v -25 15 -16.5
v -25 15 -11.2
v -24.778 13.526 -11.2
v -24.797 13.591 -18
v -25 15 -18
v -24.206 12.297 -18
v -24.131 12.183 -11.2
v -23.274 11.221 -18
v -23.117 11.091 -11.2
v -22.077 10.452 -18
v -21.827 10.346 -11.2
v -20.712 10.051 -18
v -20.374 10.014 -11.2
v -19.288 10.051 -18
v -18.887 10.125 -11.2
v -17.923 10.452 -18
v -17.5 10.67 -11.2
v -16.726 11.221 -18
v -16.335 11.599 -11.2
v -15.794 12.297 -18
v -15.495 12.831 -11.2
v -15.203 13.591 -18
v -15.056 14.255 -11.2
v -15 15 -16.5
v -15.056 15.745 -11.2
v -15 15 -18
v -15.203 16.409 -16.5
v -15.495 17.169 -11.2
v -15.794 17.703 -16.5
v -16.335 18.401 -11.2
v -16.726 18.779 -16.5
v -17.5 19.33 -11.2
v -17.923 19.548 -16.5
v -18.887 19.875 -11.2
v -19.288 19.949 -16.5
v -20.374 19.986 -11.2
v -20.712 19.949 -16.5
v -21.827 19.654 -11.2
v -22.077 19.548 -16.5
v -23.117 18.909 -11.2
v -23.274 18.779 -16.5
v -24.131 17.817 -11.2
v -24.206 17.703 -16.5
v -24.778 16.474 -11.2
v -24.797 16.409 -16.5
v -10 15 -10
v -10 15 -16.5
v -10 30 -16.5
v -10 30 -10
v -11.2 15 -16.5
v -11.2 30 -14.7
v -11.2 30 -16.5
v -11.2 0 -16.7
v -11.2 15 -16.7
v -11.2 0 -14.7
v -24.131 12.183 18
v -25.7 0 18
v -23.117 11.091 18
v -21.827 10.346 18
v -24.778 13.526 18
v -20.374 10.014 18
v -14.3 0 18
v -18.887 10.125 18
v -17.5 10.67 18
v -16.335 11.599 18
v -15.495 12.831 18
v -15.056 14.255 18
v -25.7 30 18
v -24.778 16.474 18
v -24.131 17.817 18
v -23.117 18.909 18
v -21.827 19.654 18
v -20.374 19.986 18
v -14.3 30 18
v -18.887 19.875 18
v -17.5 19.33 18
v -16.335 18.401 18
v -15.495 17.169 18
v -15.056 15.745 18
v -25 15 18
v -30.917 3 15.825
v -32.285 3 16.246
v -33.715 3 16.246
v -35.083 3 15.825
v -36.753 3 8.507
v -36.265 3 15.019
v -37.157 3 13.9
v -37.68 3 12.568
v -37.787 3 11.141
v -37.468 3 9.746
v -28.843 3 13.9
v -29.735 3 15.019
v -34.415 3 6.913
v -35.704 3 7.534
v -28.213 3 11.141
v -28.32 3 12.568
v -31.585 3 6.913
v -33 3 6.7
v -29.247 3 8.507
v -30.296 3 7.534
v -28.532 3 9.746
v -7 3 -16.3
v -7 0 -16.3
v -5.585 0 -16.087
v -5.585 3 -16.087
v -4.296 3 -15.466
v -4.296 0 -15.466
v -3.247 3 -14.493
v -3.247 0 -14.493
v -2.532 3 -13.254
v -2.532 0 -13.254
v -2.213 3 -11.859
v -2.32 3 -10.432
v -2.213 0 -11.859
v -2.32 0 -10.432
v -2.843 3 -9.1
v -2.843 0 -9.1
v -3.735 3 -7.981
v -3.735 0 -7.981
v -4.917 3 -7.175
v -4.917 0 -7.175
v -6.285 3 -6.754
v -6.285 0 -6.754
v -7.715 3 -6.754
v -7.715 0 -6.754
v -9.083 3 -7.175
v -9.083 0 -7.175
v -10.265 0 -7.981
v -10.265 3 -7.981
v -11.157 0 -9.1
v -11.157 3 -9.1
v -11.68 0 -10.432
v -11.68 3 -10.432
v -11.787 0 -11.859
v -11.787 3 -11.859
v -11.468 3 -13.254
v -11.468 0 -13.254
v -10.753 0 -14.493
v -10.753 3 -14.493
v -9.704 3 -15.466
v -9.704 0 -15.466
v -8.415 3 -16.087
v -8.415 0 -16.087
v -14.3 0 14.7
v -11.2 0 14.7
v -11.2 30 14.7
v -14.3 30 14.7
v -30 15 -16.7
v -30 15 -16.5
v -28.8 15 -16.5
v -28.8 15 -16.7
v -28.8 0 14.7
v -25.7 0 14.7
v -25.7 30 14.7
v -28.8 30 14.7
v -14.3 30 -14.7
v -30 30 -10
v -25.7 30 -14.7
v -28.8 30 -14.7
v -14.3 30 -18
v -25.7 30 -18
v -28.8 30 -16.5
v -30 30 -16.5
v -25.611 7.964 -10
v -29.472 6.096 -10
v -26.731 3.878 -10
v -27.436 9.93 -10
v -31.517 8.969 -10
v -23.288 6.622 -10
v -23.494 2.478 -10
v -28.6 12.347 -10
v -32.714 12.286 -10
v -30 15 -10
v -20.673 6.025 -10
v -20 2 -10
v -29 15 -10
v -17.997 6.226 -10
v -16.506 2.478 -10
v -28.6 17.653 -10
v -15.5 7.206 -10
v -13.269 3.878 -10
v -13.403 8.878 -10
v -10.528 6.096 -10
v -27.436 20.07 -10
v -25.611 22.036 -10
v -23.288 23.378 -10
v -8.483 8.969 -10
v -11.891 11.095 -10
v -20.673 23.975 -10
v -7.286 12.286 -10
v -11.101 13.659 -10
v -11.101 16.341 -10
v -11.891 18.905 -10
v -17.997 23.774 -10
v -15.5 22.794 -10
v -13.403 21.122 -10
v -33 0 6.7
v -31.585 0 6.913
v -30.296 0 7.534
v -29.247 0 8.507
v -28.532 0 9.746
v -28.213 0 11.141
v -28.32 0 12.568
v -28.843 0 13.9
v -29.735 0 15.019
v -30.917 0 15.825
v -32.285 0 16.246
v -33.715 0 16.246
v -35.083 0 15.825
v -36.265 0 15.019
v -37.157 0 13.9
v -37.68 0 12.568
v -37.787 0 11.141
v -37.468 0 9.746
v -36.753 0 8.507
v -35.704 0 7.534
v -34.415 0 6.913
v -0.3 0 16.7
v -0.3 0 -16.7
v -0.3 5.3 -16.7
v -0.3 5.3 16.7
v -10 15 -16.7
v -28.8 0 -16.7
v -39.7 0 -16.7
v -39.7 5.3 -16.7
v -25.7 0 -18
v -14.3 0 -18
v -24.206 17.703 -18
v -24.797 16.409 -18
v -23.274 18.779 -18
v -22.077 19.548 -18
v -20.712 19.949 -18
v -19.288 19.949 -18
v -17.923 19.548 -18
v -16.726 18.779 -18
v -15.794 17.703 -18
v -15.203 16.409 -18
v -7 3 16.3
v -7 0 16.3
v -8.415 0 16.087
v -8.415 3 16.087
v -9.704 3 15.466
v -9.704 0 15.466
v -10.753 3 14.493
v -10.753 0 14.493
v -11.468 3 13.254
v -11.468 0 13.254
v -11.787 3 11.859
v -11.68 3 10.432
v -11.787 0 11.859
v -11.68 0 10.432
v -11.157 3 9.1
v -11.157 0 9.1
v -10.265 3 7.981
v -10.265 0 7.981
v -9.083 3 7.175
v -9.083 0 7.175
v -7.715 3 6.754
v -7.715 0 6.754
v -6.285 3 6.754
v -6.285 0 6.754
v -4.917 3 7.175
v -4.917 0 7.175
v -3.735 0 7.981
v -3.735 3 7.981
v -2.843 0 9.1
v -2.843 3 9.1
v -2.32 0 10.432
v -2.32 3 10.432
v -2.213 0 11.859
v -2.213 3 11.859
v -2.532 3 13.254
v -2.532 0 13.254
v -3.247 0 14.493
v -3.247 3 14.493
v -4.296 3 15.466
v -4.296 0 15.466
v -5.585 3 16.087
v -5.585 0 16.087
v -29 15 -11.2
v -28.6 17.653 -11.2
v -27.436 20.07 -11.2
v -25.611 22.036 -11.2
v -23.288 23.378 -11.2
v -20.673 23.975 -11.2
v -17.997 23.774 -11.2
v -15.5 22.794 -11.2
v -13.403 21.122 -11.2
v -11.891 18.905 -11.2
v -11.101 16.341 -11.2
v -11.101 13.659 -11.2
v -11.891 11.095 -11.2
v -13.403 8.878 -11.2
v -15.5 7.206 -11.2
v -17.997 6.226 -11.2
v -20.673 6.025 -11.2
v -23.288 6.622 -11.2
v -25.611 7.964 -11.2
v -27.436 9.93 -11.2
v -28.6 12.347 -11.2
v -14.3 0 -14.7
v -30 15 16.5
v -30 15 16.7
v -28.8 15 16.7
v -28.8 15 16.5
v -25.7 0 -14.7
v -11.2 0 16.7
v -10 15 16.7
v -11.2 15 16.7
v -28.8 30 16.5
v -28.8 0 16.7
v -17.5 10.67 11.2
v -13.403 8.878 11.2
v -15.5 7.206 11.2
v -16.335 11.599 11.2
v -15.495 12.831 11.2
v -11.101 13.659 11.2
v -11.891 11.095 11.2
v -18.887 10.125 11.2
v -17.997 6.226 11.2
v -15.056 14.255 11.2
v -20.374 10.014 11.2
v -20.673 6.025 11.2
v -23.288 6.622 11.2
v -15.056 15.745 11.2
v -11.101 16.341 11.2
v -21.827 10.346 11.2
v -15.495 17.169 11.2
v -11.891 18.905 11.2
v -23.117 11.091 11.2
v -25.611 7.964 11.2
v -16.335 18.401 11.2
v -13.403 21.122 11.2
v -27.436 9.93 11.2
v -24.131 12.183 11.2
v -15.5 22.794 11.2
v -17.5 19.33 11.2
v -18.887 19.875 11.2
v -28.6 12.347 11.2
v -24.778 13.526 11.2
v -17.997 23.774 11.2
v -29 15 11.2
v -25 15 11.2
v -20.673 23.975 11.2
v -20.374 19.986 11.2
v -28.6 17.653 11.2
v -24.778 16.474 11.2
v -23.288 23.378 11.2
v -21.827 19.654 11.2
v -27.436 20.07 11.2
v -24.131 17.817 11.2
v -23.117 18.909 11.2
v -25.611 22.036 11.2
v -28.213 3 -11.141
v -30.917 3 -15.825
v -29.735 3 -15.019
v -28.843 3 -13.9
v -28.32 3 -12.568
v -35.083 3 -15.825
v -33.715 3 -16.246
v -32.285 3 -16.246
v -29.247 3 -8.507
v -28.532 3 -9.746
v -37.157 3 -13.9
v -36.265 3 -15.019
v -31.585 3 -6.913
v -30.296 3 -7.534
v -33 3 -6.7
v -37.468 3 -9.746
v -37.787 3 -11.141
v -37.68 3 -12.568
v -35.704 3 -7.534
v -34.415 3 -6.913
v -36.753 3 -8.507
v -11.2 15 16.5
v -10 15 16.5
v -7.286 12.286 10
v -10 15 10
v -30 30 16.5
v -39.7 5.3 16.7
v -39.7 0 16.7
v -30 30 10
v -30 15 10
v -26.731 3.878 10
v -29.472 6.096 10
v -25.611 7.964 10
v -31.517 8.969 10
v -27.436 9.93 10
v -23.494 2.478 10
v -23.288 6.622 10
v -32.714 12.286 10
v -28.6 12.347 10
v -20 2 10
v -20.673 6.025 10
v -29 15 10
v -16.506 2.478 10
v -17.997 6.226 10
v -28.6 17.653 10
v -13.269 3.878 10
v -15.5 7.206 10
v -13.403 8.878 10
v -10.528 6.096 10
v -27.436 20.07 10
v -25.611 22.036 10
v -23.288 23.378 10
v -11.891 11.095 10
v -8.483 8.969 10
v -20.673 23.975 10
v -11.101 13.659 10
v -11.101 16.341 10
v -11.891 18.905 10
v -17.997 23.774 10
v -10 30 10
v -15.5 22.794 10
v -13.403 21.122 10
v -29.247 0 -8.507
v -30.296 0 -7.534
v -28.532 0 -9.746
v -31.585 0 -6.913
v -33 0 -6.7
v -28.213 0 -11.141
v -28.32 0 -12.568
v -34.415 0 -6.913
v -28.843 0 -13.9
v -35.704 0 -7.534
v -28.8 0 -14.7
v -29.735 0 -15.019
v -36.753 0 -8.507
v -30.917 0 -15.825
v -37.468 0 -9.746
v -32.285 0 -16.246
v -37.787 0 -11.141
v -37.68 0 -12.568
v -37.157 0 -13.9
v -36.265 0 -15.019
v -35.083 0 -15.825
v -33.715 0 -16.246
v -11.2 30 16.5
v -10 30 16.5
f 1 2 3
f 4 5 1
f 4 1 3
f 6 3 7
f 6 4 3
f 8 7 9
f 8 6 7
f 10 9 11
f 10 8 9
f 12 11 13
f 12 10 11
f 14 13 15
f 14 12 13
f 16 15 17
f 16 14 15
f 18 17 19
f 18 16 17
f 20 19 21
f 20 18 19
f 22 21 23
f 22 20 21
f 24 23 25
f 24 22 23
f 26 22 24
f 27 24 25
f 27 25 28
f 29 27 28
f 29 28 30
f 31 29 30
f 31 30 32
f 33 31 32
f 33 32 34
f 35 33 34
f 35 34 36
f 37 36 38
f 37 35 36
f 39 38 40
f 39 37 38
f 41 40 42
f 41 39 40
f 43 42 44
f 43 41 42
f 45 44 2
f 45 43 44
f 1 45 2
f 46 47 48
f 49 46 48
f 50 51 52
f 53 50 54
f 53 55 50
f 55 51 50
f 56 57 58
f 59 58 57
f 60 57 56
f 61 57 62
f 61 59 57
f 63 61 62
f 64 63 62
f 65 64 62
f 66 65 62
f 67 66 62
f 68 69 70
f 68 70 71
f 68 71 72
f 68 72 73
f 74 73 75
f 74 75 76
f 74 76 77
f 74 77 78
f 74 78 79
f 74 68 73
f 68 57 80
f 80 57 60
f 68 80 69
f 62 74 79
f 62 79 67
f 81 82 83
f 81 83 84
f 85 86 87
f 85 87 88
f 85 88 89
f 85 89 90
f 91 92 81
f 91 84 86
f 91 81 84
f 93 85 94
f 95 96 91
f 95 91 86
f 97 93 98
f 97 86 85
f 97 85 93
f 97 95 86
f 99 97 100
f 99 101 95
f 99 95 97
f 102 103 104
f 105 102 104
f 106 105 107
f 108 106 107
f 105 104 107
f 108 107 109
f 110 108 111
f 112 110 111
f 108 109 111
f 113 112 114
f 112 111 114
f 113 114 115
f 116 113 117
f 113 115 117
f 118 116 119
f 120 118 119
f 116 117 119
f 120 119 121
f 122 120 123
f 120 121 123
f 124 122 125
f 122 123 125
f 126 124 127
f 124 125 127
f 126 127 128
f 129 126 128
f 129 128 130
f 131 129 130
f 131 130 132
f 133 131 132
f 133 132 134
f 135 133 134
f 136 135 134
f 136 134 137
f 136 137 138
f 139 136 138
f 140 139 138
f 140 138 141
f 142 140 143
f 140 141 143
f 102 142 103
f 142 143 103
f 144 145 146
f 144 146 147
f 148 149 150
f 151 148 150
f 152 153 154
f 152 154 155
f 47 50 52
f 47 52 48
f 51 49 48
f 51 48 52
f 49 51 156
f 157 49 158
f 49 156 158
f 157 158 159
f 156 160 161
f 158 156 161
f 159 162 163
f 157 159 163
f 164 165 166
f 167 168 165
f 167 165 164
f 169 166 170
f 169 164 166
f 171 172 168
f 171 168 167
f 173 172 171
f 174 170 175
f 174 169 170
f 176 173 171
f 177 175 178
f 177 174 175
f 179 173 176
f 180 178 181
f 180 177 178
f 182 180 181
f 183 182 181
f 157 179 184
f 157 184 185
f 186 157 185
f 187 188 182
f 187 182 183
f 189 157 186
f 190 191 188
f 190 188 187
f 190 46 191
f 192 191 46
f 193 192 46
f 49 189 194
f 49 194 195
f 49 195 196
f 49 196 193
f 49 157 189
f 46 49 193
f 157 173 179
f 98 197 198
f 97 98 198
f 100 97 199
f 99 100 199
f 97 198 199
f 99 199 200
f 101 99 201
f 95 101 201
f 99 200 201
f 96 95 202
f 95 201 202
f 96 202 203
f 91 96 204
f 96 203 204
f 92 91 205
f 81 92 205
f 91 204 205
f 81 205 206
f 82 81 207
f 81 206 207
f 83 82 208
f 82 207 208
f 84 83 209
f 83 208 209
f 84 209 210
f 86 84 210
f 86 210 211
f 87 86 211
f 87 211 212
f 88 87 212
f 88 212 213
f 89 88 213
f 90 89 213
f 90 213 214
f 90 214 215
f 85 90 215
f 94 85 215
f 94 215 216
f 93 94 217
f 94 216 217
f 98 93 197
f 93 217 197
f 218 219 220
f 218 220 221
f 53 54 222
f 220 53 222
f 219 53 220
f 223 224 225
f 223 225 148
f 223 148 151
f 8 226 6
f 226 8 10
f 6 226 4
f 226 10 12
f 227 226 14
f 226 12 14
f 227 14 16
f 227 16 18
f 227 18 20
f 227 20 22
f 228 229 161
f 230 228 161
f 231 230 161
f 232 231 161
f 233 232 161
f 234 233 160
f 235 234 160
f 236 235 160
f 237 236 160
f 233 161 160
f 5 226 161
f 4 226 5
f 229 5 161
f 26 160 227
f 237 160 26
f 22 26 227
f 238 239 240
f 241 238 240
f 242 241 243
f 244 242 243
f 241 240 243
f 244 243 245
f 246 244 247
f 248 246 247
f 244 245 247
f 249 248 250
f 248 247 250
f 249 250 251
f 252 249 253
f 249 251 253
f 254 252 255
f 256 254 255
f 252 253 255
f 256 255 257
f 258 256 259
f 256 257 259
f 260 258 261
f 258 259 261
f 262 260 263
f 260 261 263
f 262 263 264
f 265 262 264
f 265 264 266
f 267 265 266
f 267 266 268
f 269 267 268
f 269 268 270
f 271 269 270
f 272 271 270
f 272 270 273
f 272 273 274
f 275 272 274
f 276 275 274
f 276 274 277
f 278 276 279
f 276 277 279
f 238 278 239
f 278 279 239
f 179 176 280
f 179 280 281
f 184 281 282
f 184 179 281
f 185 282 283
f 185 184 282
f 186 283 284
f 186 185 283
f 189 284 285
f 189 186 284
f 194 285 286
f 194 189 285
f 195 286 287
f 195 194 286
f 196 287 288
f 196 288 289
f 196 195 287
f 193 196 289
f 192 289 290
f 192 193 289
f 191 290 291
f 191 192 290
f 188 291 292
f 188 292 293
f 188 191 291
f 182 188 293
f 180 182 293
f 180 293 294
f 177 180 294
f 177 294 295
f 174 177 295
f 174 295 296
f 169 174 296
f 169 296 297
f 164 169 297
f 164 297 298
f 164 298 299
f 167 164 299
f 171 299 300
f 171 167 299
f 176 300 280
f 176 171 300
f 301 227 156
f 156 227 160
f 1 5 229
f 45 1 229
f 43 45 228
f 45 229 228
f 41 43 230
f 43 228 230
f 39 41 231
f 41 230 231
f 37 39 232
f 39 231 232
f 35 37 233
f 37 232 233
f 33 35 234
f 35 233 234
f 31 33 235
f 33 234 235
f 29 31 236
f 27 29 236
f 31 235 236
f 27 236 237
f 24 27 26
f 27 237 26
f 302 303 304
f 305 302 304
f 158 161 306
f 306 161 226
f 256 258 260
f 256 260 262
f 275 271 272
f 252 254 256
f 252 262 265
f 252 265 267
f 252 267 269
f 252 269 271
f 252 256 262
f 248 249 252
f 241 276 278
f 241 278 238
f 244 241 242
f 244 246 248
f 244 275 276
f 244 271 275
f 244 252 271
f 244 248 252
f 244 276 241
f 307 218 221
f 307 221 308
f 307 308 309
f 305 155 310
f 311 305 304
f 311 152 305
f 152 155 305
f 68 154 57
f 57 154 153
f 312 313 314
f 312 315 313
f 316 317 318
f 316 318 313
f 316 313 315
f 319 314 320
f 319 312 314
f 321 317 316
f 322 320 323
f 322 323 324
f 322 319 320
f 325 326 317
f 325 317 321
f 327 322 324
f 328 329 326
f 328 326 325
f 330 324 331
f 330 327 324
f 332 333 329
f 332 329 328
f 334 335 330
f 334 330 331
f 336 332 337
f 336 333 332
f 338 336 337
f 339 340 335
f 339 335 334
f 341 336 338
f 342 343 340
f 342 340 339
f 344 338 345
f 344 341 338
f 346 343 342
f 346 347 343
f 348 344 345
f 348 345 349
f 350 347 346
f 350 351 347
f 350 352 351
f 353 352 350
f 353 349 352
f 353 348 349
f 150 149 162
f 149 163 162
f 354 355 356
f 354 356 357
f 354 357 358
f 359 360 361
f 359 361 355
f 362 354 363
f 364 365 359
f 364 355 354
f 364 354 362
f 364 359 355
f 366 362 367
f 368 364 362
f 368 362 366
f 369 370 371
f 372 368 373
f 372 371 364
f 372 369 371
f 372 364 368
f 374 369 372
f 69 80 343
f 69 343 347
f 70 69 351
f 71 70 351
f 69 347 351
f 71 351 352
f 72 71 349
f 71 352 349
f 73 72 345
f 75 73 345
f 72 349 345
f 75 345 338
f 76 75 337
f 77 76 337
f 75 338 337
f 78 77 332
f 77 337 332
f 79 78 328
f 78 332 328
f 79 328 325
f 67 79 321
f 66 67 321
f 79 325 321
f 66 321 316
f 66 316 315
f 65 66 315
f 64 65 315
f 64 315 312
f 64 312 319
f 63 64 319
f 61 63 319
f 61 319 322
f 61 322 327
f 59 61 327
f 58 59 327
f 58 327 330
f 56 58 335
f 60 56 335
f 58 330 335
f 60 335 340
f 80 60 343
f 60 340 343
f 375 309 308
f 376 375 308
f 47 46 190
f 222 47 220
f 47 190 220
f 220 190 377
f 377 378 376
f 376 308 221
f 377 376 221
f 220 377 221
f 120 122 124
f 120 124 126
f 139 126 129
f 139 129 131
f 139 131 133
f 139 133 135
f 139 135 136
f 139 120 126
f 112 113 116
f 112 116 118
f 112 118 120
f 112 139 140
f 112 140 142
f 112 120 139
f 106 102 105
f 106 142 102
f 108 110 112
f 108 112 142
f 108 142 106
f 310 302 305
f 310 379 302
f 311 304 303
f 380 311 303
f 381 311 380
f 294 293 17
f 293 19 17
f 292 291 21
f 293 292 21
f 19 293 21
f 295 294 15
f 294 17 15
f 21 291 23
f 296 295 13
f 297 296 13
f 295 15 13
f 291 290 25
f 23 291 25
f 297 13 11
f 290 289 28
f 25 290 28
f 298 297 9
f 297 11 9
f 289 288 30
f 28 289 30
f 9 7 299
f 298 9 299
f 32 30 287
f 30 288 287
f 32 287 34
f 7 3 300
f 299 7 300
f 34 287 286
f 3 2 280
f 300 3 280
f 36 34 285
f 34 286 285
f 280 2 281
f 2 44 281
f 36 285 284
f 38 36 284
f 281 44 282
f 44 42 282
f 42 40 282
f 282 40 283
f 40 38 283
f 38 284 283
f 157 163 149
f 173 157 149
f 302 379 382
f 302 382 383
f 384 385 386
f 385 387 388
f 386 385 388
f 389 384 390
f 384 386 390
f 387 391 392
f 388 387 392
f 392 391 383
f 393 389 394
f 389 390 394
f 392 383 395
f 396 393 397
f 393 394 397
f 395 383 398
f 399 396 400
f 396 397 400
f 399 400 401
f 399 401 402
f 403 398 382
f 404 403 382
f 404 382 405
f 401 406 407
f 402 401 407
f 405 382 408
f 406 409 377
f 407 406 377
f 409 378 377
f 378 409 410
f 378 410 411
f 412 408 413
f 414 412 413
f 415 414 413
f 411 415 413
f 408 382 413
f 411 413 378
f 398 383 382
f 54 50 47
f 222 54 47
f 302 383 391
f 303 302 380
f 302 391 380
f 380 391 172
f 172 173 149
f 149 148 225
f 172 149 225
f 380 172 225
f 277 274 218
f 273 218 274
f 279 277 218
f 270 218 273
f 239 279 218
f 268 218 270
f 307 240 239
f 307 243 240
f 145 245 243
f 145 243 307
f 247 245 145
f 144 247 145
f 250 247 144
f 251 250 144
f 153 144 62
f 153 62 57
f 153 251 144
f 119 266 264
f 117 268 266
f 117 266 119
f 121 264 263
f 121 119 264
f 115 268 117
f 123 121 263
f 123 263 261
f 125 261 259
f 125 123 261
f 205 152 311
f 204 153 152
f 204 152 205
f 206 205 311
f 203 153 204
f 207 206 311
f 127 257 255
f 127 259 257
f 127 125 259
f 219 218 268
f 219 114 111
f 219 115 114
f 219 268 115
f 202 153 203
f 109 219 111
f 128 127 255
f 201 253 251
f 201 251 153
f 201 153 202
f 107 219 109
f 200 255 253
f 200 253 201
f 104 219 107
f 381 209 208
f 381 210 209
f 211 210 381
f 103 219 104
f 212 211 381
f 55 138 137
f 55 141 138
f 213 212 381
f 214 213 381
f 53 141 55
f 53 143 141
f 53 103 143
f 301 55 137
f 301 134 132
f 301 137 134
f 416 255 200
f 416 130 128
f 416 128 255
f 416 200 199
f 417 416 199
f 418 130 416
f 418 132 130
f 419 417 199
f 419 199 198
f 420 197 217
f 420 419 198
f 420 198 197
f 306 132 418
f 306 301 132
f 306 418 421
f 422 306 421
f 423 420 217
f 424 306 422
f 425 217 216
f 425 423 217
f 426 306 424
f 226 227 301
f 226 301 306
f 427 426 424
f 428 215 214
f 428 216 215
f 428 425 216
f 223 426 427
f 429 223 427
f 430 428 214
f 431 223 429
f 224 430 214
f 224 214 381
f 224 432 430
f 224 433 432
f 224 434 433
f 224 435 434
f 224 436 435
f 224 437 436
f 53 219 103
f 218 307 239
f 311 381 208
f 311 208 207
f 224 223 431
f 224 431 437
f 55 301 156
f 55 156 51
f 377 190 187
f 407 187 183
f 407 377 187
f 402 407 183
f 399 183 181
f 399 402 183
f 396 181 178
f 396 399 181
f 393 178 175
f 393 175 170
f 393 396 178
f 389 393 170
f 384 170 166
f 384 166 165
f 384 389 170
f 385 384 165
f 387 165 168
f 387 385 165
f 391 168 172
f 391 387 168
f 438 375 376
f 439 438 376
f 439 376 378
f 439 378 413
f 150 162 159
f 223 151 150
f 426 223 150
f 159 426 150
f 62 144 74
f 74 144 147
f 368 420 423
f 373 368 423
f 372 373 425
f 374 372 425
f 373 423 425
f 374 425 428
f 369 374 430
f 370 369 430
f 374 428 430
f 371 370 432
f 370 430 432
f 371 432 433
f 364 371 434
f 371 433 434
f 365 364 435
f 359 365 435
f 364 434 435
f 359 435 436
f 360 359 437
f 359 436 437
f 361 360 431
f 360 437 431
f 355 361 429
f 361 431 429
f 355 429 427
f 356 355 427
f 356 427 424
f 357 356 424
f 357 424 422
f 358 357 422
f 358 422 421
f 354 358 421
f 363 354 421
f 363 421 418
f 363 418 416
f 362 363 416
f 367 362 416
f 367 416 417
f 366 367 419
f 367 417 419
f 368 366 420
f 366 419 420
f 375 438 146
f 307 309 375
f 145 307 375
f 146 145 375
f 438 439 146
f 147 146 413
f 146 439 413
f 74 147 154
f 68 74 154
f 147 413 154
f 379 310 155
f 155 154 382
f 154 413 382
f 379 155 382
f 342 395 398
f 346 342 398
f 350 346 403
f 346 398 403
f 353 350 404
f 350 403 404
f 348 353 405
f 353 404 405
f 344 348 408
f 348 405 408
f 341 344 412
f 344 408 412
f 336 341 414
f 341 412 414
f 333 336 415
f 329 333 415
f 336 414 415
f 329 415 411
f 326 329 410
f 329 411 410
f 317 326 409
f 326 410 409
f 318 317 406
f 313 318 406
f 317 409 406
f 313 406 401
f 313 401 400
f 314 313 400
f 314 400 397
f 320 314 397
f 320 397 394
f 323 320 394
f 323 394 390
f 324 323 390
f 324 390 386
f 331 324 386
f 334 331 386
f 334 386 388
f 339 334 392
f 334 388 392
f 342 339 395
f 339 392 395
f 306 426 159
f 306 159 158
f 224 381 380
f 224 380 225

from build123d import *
from build123d.topology import SkipClean

# Parameters (mm, degrees)
SKETCH5_W            = 40
SKETCH5_H            = 15
BOSS_EXTRUDE2_DEPTH  = 17
SKETCH6_R            = 13
CUT_EXTRUDE4_DEPTH   = 10
SKETCH7_R            = 2.5
CUT_EXTRUDE5_DEPTH   = 4.5
CHAMFER8_SIZE        = 10
BOSS_EXTRUDE3_START  = -6.5
BOSS_EXTRUDE3_DEPTH  = 6.5
SKETCH8_R            = 4.8
CUT_EXTRUDE8_DEPTH   = 3
SKETCH9_W            = 2.5
SKETCH9_H            = 2
CUT_EXTRUDE7_DEPTH   = 52
SKETCH11_R           = 5
CUT_EXTRUDE9_DEPTH   = 45
SKETCH12_R           = 9
SKETCH12_R_2         = 5
CUT_EXTRUDE11_DEPTH  = 1.2
CUT_EXTRUDE12_DEPTH  = 53.810983706
BOSS_EXTRUDE4_START  = 1.3
BOSS_EXTRUDE4_DEPTH  = 1.3
BOSS_EXTRUDE8_START  = -33.4
BOSS_EXTRUDE8_DEPTH  = 1.3
BOSS_EXTRUDE9_DEPTH  = 1.5
BOSS_EXTRUDE10_START = -34.5
BOSS_EXTRUDE10_DEPTH = 1.5


# Read off the part's stored shape, not the designer's step: Boss-Extrude3
with BuildPart() as part:
    # Sketch5 → Boss-Extrude2 (new body)
    with BuildSketch(Plane.XY):
        with Locations((-20, 7.5)):
            Rectangle(SKETCH5_W, SKETCH5_H)
    boss_extrude2 = extrude(amount=BOSS_EXTRUDE2_DEPTH)

    # Sketch6 → Cut-Extrude4 (cut)
    with BuildSketch(Plane(origin=(0, 0, 0), x_dir=(-1, 0, 0), z_dir=(0, 0, -1))):
        with Locations((20, 15)):
            Circle(SKETCH6_R)
    cut_extrude4 = extrude(amount=-CUT_EXTRUDE4_DEPTH, mode=Mode.SUBTRACT)

    # Sketch7 → Cut-Extrude5 (cut)
    with BuildSketch(Plane.XY.offset(17)):
        with Locations((-20, 15)):
            Circle(SKETCH7_R)
    cut_extrude5 = extrude(amount=-CUT_EXTRUDE5_DEPTH, mode=Mode.SUBTRACT)

    # Mirror5: Boss-Extrude2, Cut-Extrude4, Cut-Extrude5 across plane
    with SkipClean():  # the faces are left unmerged after this step: merging them gives an invalid solid
        add(boss_extrude2.mirror(Plane.XY))
        add(cut_extrude4.mirror(Plane.XY), mode=Mode.SUBTRACT)
        add(cut_extrude5.mirror(Plane.XY), mode=Mode.SUBTRACT)
    add(part.part.scale(1), mode=Mode.REPLACE)  # the faces are merged on a copy

    # Chamfer8
    # the kernel refuses this chamfer: 10 mm, written as the material it takes off along each edge
    with BuildSketch(Plane(origin=(-40, 15, -42.71682988), x_dir=(0.9996219169112968, 0.027495876610586317, 0), z_dir=(0, 0, 1)), Plane(origin=(0, 15, 42.71682988), x_dir=(-0.9996219169112968, 0.027495876610586317, 0), z_dir=(0, 0, -1))) as chamfer8_piece_1:
        Polygon((CHAMFER8_SIZE * 0.999621916911, -CHAMFER8_SIZE * 0.0274958766106), (-CHAMFER8_SIZE * 0.0274958766106, -CHAMFER8_SIZE * 0.999621916911), (0, 0), align=None)
    extrude(amount=85.433659759, mode=Mode.SUBTRACT)

    # Boss-Extrude3 outline → Boss-Extrude3 (add)
    with BuildSketch(Plane.XY.offset(-10).offset(BOSS_EXTRUDE3_START)):
        with BuildLine():
            Line((-10, 30), (-30, 30))
            Line((-30, 30), (-30, 15))
            Line((-30, 15), (-22.5, 15))
            ThreePointArc((-22.5, 15), (-20, 12.5), (-17.5, 15))
            Line((-17.5, 15), (-10, 15))
            Line((-10, 15), (-10, 30))
        make_face()
    boss_extrude3 = extrude(amount=BOSS_EXTRUDE3_DEPTH)

    # Mirror6: Boss-Extrude3 across plane
    add(boss_extrude3.mirror(Plane(origin=(0, 0, 0), x_dir=(1, 0, 0), z_dir=(0, 0, -1))))

    # Sketch8 → Cut-Extrude8 (cut)
    with BuildSketch(Plane.XZ):
        with Locations(Location((-33, 11.5, 0), (0, 0, 270))):
            Circle(SKETCH8_R)
        with Locations(Location((-7, 11.5, 0), (0, 0, 90))):
            Circle(SKETCH8_R)
        with Locations(Location((-7, -11.5, 0), (0, 0, 270))):
            Circle(SKETCH8_R)
        with Locations(Location((-33, -11.5, 0), (0, 0, 90))):
            Circle(SKETCH8_R)
    extrude(amount=-CUT_EXTRUDE8_DEPTH, mode=Mode.SUBTRACT)

    # Sketch9 → Cut-Extrude7 (cut)
    with BuildSketch(Plane.XZ):
        with Locations((-12.75, 16)):
            Rectangle(SKETCH9_W, SKETCH9_H)
        with Locations((-27.25, 16)):
            Rectangle(SKETCH9_W, SKETCH9_H)
        with Locations((-12.75, -16)):
            Rectangle(SKETCH9_W, SKETCH9_H)
        with Locations((-27.25, -16)):
            Rectangle(SKETCH9_W, SKETCH9_H)
    extrude(amount=-CUT_EXTRUDE7_DEPTH, mode=Mode.SUBTRACT)

    # Sketch11 → Cut-Extrude9 (cut, symmetric)
    with BuildSketch(Plane(origin=(0, 0, 10), x_dir=(-1, 0, 0), z_dir=(0, 0, -1))):
        with Locations((20, 15)):
            Circle(SKETCH11_R)
    extrude(amount=CUT_EXTRUDE9_DEPTH, both=True, mode=Mode.SUBTRACT)

    # Sketch12 → Cut-Extrude11 (cut)
    with BuildSketch(Plane(origin=(0, 0, 10), x_dir=(-1, 0, 0), z_dir=(0, 0, -1))):
        with Locations((20, 15)):
            Circle(SKETCH12_R)
        with Locations((20, 15)):
            Circle(SKETCH12_R_2, mode=Mode.SUBTRACT)
    cut_extrude11 = extrude(amount=-CUT_EXTRUDE11_DEPTH, mode=Mode.SUBTRACT)

    # Mirror7: Cut-Extrude11 across plane
    add(cut_extrude11.mirror(Plane(origin=(0, 0, 0), x_dir=(1, 0, 0), z_dir=(0, 0, -1))), mode=Mode.SUBTRACT)

    # Sketch13 → Cut-Extrude12 (cut, through all)
    with BuildSketch(Plane.XZ):
        Polygon((-26, 15), (-28.5, 15), (-28.5, 17), (-40, 17), (-40, -17), (-28.5, -17), (-28.5, -15), (-26, -15), (-26, -17), (-14, -17), (-14, -15), (-11.5, -15), (-11.5, -17), (0, -17), (0, 17), (-11.5, 17), (-11.5, 15), (-14, 15), (-14, 17), (-26, 17), align=None)
        Polygon((-25.7, 14.7), (-28.8, 14.7), (-28.8, 16.7), (-39.7, 16.7), (-39.7, -16.7), (-28.8, -16.7), (-28.8, -14.7), (-25.7, -14.7), (-25.7, -16.7), (-14.3, -16.7), (-14.3, -14.7), (-11.2, -14.7), (-11.2, -16.7), (-0.3, -16.7), (-0.3, 16.7), (-11.2, 16.7), (-11.2, 14.7), (-14.3, 14.7), (-14.3, 16.7), (-25.7, 16.7), align=None, mode=Mode.SUBTRACT)
    extrude(amount=-CUT_EXTRUDE12_DEPTH, mode=Mode.SUBTRACT)

    # Sketch14 → Boss-Extrude4 (add)
    with SkipClean():  # the faces are left unmerged after this step: merging them gives an invalid solid
        with BuildSketch(Plane(origin=(0, 0, -16.7), x_dir=(-1, 0, 0), z_dir=(0, 0, -1)).offset(BOSS_EXTRUDE4_START)):
            with BuildLine():
                Line((15, 15), (14.3, 15))
                Line((14.3, 15), (14.3, 0))
                Line((14.3, 0), (25.7, 0))
                Line((25.7, 0), (25.7, 15))
                Line((25.7, 15), (25, 15))
                ThreePointArc((25, 15), (20, 10), (15, 15))
            make_face()
        extrude(amount=-BOSS_EXTRUDE4_DEPTH)
    add(part.part.scale(1), mode=Mode.REPLACE)  # the faces are merged on a copy

    # Sketch14<3> → Boss-Extrude8 (add)
    with BuildSketch(Plane(origin=(0, 0, -16.7), x_dir=(-1, 0, 0), z_dir=(0, 0, -1)).offset(BOSS_EXTRUDE8_START)):
        with BuildLine():
            Line((15, 15), (14.3, 15))
            Line((14.3, 15), (14.3, 0))
            Line((14.3, 0), (25.7, 0))
            Line((25.7, 0), (25.7, 15))
            Line((25.7, 15), (25, 15))
            ThreePointArc((25, 15), (20, 10), (15, 15))
        make_face()
    extrude(amount=-BOSS_EXTRUDE8_DEPTH)

    # Sketch16 → Boss-Extrude9 (add)
    with BuildSketch(Plane.XY.offset(16.5)):
        with BuildLine():
            Line((-25.7, 30), (-25.7, 15))
            Line((-25.7, 15), (-25, 15))
            ThreePointArc((-25, 15), (-20, 20), (-15, 15))
            Line((-15, 15), (-14.3, 15))
            Line((-14.3, 15), (-14.3, 30))
            Line((-14.3, 30), (-25.7, 30))
        make_face()
    extrude(amount=BOSS_EXTRUDE9_DEPTH)

    # Sketch16<2> → Boss-Extrude10 (add)
    with SkipClean():  # the faces are left unmerged after this step: merging them gives an invalid solid
        with BuildSketch(Plane.XY.offset(16.5).offset(BOSS_EXTRUDE10_START)):
            with BuildLine():
                Line((-25.7, 30), (-25.7, 15))
                Line((-25.7, 15), (-25, 15))
                ThreePointArc((-25, 15), (-20, 20), (-15, 15))
                Line((-15, 15), (-14.3, 15))
                Line((-14.3, 15), (-14.3, 30))
                Line((-14.3, 30), (-25.7, 30))
            make_face()
        extrude(amount=BOSS_EXTRUDE10_DEPTH)
    add(part.part.scale(1), mode=Mode.REPLACE)  # the faces are merged on a copy


solid = part.part
